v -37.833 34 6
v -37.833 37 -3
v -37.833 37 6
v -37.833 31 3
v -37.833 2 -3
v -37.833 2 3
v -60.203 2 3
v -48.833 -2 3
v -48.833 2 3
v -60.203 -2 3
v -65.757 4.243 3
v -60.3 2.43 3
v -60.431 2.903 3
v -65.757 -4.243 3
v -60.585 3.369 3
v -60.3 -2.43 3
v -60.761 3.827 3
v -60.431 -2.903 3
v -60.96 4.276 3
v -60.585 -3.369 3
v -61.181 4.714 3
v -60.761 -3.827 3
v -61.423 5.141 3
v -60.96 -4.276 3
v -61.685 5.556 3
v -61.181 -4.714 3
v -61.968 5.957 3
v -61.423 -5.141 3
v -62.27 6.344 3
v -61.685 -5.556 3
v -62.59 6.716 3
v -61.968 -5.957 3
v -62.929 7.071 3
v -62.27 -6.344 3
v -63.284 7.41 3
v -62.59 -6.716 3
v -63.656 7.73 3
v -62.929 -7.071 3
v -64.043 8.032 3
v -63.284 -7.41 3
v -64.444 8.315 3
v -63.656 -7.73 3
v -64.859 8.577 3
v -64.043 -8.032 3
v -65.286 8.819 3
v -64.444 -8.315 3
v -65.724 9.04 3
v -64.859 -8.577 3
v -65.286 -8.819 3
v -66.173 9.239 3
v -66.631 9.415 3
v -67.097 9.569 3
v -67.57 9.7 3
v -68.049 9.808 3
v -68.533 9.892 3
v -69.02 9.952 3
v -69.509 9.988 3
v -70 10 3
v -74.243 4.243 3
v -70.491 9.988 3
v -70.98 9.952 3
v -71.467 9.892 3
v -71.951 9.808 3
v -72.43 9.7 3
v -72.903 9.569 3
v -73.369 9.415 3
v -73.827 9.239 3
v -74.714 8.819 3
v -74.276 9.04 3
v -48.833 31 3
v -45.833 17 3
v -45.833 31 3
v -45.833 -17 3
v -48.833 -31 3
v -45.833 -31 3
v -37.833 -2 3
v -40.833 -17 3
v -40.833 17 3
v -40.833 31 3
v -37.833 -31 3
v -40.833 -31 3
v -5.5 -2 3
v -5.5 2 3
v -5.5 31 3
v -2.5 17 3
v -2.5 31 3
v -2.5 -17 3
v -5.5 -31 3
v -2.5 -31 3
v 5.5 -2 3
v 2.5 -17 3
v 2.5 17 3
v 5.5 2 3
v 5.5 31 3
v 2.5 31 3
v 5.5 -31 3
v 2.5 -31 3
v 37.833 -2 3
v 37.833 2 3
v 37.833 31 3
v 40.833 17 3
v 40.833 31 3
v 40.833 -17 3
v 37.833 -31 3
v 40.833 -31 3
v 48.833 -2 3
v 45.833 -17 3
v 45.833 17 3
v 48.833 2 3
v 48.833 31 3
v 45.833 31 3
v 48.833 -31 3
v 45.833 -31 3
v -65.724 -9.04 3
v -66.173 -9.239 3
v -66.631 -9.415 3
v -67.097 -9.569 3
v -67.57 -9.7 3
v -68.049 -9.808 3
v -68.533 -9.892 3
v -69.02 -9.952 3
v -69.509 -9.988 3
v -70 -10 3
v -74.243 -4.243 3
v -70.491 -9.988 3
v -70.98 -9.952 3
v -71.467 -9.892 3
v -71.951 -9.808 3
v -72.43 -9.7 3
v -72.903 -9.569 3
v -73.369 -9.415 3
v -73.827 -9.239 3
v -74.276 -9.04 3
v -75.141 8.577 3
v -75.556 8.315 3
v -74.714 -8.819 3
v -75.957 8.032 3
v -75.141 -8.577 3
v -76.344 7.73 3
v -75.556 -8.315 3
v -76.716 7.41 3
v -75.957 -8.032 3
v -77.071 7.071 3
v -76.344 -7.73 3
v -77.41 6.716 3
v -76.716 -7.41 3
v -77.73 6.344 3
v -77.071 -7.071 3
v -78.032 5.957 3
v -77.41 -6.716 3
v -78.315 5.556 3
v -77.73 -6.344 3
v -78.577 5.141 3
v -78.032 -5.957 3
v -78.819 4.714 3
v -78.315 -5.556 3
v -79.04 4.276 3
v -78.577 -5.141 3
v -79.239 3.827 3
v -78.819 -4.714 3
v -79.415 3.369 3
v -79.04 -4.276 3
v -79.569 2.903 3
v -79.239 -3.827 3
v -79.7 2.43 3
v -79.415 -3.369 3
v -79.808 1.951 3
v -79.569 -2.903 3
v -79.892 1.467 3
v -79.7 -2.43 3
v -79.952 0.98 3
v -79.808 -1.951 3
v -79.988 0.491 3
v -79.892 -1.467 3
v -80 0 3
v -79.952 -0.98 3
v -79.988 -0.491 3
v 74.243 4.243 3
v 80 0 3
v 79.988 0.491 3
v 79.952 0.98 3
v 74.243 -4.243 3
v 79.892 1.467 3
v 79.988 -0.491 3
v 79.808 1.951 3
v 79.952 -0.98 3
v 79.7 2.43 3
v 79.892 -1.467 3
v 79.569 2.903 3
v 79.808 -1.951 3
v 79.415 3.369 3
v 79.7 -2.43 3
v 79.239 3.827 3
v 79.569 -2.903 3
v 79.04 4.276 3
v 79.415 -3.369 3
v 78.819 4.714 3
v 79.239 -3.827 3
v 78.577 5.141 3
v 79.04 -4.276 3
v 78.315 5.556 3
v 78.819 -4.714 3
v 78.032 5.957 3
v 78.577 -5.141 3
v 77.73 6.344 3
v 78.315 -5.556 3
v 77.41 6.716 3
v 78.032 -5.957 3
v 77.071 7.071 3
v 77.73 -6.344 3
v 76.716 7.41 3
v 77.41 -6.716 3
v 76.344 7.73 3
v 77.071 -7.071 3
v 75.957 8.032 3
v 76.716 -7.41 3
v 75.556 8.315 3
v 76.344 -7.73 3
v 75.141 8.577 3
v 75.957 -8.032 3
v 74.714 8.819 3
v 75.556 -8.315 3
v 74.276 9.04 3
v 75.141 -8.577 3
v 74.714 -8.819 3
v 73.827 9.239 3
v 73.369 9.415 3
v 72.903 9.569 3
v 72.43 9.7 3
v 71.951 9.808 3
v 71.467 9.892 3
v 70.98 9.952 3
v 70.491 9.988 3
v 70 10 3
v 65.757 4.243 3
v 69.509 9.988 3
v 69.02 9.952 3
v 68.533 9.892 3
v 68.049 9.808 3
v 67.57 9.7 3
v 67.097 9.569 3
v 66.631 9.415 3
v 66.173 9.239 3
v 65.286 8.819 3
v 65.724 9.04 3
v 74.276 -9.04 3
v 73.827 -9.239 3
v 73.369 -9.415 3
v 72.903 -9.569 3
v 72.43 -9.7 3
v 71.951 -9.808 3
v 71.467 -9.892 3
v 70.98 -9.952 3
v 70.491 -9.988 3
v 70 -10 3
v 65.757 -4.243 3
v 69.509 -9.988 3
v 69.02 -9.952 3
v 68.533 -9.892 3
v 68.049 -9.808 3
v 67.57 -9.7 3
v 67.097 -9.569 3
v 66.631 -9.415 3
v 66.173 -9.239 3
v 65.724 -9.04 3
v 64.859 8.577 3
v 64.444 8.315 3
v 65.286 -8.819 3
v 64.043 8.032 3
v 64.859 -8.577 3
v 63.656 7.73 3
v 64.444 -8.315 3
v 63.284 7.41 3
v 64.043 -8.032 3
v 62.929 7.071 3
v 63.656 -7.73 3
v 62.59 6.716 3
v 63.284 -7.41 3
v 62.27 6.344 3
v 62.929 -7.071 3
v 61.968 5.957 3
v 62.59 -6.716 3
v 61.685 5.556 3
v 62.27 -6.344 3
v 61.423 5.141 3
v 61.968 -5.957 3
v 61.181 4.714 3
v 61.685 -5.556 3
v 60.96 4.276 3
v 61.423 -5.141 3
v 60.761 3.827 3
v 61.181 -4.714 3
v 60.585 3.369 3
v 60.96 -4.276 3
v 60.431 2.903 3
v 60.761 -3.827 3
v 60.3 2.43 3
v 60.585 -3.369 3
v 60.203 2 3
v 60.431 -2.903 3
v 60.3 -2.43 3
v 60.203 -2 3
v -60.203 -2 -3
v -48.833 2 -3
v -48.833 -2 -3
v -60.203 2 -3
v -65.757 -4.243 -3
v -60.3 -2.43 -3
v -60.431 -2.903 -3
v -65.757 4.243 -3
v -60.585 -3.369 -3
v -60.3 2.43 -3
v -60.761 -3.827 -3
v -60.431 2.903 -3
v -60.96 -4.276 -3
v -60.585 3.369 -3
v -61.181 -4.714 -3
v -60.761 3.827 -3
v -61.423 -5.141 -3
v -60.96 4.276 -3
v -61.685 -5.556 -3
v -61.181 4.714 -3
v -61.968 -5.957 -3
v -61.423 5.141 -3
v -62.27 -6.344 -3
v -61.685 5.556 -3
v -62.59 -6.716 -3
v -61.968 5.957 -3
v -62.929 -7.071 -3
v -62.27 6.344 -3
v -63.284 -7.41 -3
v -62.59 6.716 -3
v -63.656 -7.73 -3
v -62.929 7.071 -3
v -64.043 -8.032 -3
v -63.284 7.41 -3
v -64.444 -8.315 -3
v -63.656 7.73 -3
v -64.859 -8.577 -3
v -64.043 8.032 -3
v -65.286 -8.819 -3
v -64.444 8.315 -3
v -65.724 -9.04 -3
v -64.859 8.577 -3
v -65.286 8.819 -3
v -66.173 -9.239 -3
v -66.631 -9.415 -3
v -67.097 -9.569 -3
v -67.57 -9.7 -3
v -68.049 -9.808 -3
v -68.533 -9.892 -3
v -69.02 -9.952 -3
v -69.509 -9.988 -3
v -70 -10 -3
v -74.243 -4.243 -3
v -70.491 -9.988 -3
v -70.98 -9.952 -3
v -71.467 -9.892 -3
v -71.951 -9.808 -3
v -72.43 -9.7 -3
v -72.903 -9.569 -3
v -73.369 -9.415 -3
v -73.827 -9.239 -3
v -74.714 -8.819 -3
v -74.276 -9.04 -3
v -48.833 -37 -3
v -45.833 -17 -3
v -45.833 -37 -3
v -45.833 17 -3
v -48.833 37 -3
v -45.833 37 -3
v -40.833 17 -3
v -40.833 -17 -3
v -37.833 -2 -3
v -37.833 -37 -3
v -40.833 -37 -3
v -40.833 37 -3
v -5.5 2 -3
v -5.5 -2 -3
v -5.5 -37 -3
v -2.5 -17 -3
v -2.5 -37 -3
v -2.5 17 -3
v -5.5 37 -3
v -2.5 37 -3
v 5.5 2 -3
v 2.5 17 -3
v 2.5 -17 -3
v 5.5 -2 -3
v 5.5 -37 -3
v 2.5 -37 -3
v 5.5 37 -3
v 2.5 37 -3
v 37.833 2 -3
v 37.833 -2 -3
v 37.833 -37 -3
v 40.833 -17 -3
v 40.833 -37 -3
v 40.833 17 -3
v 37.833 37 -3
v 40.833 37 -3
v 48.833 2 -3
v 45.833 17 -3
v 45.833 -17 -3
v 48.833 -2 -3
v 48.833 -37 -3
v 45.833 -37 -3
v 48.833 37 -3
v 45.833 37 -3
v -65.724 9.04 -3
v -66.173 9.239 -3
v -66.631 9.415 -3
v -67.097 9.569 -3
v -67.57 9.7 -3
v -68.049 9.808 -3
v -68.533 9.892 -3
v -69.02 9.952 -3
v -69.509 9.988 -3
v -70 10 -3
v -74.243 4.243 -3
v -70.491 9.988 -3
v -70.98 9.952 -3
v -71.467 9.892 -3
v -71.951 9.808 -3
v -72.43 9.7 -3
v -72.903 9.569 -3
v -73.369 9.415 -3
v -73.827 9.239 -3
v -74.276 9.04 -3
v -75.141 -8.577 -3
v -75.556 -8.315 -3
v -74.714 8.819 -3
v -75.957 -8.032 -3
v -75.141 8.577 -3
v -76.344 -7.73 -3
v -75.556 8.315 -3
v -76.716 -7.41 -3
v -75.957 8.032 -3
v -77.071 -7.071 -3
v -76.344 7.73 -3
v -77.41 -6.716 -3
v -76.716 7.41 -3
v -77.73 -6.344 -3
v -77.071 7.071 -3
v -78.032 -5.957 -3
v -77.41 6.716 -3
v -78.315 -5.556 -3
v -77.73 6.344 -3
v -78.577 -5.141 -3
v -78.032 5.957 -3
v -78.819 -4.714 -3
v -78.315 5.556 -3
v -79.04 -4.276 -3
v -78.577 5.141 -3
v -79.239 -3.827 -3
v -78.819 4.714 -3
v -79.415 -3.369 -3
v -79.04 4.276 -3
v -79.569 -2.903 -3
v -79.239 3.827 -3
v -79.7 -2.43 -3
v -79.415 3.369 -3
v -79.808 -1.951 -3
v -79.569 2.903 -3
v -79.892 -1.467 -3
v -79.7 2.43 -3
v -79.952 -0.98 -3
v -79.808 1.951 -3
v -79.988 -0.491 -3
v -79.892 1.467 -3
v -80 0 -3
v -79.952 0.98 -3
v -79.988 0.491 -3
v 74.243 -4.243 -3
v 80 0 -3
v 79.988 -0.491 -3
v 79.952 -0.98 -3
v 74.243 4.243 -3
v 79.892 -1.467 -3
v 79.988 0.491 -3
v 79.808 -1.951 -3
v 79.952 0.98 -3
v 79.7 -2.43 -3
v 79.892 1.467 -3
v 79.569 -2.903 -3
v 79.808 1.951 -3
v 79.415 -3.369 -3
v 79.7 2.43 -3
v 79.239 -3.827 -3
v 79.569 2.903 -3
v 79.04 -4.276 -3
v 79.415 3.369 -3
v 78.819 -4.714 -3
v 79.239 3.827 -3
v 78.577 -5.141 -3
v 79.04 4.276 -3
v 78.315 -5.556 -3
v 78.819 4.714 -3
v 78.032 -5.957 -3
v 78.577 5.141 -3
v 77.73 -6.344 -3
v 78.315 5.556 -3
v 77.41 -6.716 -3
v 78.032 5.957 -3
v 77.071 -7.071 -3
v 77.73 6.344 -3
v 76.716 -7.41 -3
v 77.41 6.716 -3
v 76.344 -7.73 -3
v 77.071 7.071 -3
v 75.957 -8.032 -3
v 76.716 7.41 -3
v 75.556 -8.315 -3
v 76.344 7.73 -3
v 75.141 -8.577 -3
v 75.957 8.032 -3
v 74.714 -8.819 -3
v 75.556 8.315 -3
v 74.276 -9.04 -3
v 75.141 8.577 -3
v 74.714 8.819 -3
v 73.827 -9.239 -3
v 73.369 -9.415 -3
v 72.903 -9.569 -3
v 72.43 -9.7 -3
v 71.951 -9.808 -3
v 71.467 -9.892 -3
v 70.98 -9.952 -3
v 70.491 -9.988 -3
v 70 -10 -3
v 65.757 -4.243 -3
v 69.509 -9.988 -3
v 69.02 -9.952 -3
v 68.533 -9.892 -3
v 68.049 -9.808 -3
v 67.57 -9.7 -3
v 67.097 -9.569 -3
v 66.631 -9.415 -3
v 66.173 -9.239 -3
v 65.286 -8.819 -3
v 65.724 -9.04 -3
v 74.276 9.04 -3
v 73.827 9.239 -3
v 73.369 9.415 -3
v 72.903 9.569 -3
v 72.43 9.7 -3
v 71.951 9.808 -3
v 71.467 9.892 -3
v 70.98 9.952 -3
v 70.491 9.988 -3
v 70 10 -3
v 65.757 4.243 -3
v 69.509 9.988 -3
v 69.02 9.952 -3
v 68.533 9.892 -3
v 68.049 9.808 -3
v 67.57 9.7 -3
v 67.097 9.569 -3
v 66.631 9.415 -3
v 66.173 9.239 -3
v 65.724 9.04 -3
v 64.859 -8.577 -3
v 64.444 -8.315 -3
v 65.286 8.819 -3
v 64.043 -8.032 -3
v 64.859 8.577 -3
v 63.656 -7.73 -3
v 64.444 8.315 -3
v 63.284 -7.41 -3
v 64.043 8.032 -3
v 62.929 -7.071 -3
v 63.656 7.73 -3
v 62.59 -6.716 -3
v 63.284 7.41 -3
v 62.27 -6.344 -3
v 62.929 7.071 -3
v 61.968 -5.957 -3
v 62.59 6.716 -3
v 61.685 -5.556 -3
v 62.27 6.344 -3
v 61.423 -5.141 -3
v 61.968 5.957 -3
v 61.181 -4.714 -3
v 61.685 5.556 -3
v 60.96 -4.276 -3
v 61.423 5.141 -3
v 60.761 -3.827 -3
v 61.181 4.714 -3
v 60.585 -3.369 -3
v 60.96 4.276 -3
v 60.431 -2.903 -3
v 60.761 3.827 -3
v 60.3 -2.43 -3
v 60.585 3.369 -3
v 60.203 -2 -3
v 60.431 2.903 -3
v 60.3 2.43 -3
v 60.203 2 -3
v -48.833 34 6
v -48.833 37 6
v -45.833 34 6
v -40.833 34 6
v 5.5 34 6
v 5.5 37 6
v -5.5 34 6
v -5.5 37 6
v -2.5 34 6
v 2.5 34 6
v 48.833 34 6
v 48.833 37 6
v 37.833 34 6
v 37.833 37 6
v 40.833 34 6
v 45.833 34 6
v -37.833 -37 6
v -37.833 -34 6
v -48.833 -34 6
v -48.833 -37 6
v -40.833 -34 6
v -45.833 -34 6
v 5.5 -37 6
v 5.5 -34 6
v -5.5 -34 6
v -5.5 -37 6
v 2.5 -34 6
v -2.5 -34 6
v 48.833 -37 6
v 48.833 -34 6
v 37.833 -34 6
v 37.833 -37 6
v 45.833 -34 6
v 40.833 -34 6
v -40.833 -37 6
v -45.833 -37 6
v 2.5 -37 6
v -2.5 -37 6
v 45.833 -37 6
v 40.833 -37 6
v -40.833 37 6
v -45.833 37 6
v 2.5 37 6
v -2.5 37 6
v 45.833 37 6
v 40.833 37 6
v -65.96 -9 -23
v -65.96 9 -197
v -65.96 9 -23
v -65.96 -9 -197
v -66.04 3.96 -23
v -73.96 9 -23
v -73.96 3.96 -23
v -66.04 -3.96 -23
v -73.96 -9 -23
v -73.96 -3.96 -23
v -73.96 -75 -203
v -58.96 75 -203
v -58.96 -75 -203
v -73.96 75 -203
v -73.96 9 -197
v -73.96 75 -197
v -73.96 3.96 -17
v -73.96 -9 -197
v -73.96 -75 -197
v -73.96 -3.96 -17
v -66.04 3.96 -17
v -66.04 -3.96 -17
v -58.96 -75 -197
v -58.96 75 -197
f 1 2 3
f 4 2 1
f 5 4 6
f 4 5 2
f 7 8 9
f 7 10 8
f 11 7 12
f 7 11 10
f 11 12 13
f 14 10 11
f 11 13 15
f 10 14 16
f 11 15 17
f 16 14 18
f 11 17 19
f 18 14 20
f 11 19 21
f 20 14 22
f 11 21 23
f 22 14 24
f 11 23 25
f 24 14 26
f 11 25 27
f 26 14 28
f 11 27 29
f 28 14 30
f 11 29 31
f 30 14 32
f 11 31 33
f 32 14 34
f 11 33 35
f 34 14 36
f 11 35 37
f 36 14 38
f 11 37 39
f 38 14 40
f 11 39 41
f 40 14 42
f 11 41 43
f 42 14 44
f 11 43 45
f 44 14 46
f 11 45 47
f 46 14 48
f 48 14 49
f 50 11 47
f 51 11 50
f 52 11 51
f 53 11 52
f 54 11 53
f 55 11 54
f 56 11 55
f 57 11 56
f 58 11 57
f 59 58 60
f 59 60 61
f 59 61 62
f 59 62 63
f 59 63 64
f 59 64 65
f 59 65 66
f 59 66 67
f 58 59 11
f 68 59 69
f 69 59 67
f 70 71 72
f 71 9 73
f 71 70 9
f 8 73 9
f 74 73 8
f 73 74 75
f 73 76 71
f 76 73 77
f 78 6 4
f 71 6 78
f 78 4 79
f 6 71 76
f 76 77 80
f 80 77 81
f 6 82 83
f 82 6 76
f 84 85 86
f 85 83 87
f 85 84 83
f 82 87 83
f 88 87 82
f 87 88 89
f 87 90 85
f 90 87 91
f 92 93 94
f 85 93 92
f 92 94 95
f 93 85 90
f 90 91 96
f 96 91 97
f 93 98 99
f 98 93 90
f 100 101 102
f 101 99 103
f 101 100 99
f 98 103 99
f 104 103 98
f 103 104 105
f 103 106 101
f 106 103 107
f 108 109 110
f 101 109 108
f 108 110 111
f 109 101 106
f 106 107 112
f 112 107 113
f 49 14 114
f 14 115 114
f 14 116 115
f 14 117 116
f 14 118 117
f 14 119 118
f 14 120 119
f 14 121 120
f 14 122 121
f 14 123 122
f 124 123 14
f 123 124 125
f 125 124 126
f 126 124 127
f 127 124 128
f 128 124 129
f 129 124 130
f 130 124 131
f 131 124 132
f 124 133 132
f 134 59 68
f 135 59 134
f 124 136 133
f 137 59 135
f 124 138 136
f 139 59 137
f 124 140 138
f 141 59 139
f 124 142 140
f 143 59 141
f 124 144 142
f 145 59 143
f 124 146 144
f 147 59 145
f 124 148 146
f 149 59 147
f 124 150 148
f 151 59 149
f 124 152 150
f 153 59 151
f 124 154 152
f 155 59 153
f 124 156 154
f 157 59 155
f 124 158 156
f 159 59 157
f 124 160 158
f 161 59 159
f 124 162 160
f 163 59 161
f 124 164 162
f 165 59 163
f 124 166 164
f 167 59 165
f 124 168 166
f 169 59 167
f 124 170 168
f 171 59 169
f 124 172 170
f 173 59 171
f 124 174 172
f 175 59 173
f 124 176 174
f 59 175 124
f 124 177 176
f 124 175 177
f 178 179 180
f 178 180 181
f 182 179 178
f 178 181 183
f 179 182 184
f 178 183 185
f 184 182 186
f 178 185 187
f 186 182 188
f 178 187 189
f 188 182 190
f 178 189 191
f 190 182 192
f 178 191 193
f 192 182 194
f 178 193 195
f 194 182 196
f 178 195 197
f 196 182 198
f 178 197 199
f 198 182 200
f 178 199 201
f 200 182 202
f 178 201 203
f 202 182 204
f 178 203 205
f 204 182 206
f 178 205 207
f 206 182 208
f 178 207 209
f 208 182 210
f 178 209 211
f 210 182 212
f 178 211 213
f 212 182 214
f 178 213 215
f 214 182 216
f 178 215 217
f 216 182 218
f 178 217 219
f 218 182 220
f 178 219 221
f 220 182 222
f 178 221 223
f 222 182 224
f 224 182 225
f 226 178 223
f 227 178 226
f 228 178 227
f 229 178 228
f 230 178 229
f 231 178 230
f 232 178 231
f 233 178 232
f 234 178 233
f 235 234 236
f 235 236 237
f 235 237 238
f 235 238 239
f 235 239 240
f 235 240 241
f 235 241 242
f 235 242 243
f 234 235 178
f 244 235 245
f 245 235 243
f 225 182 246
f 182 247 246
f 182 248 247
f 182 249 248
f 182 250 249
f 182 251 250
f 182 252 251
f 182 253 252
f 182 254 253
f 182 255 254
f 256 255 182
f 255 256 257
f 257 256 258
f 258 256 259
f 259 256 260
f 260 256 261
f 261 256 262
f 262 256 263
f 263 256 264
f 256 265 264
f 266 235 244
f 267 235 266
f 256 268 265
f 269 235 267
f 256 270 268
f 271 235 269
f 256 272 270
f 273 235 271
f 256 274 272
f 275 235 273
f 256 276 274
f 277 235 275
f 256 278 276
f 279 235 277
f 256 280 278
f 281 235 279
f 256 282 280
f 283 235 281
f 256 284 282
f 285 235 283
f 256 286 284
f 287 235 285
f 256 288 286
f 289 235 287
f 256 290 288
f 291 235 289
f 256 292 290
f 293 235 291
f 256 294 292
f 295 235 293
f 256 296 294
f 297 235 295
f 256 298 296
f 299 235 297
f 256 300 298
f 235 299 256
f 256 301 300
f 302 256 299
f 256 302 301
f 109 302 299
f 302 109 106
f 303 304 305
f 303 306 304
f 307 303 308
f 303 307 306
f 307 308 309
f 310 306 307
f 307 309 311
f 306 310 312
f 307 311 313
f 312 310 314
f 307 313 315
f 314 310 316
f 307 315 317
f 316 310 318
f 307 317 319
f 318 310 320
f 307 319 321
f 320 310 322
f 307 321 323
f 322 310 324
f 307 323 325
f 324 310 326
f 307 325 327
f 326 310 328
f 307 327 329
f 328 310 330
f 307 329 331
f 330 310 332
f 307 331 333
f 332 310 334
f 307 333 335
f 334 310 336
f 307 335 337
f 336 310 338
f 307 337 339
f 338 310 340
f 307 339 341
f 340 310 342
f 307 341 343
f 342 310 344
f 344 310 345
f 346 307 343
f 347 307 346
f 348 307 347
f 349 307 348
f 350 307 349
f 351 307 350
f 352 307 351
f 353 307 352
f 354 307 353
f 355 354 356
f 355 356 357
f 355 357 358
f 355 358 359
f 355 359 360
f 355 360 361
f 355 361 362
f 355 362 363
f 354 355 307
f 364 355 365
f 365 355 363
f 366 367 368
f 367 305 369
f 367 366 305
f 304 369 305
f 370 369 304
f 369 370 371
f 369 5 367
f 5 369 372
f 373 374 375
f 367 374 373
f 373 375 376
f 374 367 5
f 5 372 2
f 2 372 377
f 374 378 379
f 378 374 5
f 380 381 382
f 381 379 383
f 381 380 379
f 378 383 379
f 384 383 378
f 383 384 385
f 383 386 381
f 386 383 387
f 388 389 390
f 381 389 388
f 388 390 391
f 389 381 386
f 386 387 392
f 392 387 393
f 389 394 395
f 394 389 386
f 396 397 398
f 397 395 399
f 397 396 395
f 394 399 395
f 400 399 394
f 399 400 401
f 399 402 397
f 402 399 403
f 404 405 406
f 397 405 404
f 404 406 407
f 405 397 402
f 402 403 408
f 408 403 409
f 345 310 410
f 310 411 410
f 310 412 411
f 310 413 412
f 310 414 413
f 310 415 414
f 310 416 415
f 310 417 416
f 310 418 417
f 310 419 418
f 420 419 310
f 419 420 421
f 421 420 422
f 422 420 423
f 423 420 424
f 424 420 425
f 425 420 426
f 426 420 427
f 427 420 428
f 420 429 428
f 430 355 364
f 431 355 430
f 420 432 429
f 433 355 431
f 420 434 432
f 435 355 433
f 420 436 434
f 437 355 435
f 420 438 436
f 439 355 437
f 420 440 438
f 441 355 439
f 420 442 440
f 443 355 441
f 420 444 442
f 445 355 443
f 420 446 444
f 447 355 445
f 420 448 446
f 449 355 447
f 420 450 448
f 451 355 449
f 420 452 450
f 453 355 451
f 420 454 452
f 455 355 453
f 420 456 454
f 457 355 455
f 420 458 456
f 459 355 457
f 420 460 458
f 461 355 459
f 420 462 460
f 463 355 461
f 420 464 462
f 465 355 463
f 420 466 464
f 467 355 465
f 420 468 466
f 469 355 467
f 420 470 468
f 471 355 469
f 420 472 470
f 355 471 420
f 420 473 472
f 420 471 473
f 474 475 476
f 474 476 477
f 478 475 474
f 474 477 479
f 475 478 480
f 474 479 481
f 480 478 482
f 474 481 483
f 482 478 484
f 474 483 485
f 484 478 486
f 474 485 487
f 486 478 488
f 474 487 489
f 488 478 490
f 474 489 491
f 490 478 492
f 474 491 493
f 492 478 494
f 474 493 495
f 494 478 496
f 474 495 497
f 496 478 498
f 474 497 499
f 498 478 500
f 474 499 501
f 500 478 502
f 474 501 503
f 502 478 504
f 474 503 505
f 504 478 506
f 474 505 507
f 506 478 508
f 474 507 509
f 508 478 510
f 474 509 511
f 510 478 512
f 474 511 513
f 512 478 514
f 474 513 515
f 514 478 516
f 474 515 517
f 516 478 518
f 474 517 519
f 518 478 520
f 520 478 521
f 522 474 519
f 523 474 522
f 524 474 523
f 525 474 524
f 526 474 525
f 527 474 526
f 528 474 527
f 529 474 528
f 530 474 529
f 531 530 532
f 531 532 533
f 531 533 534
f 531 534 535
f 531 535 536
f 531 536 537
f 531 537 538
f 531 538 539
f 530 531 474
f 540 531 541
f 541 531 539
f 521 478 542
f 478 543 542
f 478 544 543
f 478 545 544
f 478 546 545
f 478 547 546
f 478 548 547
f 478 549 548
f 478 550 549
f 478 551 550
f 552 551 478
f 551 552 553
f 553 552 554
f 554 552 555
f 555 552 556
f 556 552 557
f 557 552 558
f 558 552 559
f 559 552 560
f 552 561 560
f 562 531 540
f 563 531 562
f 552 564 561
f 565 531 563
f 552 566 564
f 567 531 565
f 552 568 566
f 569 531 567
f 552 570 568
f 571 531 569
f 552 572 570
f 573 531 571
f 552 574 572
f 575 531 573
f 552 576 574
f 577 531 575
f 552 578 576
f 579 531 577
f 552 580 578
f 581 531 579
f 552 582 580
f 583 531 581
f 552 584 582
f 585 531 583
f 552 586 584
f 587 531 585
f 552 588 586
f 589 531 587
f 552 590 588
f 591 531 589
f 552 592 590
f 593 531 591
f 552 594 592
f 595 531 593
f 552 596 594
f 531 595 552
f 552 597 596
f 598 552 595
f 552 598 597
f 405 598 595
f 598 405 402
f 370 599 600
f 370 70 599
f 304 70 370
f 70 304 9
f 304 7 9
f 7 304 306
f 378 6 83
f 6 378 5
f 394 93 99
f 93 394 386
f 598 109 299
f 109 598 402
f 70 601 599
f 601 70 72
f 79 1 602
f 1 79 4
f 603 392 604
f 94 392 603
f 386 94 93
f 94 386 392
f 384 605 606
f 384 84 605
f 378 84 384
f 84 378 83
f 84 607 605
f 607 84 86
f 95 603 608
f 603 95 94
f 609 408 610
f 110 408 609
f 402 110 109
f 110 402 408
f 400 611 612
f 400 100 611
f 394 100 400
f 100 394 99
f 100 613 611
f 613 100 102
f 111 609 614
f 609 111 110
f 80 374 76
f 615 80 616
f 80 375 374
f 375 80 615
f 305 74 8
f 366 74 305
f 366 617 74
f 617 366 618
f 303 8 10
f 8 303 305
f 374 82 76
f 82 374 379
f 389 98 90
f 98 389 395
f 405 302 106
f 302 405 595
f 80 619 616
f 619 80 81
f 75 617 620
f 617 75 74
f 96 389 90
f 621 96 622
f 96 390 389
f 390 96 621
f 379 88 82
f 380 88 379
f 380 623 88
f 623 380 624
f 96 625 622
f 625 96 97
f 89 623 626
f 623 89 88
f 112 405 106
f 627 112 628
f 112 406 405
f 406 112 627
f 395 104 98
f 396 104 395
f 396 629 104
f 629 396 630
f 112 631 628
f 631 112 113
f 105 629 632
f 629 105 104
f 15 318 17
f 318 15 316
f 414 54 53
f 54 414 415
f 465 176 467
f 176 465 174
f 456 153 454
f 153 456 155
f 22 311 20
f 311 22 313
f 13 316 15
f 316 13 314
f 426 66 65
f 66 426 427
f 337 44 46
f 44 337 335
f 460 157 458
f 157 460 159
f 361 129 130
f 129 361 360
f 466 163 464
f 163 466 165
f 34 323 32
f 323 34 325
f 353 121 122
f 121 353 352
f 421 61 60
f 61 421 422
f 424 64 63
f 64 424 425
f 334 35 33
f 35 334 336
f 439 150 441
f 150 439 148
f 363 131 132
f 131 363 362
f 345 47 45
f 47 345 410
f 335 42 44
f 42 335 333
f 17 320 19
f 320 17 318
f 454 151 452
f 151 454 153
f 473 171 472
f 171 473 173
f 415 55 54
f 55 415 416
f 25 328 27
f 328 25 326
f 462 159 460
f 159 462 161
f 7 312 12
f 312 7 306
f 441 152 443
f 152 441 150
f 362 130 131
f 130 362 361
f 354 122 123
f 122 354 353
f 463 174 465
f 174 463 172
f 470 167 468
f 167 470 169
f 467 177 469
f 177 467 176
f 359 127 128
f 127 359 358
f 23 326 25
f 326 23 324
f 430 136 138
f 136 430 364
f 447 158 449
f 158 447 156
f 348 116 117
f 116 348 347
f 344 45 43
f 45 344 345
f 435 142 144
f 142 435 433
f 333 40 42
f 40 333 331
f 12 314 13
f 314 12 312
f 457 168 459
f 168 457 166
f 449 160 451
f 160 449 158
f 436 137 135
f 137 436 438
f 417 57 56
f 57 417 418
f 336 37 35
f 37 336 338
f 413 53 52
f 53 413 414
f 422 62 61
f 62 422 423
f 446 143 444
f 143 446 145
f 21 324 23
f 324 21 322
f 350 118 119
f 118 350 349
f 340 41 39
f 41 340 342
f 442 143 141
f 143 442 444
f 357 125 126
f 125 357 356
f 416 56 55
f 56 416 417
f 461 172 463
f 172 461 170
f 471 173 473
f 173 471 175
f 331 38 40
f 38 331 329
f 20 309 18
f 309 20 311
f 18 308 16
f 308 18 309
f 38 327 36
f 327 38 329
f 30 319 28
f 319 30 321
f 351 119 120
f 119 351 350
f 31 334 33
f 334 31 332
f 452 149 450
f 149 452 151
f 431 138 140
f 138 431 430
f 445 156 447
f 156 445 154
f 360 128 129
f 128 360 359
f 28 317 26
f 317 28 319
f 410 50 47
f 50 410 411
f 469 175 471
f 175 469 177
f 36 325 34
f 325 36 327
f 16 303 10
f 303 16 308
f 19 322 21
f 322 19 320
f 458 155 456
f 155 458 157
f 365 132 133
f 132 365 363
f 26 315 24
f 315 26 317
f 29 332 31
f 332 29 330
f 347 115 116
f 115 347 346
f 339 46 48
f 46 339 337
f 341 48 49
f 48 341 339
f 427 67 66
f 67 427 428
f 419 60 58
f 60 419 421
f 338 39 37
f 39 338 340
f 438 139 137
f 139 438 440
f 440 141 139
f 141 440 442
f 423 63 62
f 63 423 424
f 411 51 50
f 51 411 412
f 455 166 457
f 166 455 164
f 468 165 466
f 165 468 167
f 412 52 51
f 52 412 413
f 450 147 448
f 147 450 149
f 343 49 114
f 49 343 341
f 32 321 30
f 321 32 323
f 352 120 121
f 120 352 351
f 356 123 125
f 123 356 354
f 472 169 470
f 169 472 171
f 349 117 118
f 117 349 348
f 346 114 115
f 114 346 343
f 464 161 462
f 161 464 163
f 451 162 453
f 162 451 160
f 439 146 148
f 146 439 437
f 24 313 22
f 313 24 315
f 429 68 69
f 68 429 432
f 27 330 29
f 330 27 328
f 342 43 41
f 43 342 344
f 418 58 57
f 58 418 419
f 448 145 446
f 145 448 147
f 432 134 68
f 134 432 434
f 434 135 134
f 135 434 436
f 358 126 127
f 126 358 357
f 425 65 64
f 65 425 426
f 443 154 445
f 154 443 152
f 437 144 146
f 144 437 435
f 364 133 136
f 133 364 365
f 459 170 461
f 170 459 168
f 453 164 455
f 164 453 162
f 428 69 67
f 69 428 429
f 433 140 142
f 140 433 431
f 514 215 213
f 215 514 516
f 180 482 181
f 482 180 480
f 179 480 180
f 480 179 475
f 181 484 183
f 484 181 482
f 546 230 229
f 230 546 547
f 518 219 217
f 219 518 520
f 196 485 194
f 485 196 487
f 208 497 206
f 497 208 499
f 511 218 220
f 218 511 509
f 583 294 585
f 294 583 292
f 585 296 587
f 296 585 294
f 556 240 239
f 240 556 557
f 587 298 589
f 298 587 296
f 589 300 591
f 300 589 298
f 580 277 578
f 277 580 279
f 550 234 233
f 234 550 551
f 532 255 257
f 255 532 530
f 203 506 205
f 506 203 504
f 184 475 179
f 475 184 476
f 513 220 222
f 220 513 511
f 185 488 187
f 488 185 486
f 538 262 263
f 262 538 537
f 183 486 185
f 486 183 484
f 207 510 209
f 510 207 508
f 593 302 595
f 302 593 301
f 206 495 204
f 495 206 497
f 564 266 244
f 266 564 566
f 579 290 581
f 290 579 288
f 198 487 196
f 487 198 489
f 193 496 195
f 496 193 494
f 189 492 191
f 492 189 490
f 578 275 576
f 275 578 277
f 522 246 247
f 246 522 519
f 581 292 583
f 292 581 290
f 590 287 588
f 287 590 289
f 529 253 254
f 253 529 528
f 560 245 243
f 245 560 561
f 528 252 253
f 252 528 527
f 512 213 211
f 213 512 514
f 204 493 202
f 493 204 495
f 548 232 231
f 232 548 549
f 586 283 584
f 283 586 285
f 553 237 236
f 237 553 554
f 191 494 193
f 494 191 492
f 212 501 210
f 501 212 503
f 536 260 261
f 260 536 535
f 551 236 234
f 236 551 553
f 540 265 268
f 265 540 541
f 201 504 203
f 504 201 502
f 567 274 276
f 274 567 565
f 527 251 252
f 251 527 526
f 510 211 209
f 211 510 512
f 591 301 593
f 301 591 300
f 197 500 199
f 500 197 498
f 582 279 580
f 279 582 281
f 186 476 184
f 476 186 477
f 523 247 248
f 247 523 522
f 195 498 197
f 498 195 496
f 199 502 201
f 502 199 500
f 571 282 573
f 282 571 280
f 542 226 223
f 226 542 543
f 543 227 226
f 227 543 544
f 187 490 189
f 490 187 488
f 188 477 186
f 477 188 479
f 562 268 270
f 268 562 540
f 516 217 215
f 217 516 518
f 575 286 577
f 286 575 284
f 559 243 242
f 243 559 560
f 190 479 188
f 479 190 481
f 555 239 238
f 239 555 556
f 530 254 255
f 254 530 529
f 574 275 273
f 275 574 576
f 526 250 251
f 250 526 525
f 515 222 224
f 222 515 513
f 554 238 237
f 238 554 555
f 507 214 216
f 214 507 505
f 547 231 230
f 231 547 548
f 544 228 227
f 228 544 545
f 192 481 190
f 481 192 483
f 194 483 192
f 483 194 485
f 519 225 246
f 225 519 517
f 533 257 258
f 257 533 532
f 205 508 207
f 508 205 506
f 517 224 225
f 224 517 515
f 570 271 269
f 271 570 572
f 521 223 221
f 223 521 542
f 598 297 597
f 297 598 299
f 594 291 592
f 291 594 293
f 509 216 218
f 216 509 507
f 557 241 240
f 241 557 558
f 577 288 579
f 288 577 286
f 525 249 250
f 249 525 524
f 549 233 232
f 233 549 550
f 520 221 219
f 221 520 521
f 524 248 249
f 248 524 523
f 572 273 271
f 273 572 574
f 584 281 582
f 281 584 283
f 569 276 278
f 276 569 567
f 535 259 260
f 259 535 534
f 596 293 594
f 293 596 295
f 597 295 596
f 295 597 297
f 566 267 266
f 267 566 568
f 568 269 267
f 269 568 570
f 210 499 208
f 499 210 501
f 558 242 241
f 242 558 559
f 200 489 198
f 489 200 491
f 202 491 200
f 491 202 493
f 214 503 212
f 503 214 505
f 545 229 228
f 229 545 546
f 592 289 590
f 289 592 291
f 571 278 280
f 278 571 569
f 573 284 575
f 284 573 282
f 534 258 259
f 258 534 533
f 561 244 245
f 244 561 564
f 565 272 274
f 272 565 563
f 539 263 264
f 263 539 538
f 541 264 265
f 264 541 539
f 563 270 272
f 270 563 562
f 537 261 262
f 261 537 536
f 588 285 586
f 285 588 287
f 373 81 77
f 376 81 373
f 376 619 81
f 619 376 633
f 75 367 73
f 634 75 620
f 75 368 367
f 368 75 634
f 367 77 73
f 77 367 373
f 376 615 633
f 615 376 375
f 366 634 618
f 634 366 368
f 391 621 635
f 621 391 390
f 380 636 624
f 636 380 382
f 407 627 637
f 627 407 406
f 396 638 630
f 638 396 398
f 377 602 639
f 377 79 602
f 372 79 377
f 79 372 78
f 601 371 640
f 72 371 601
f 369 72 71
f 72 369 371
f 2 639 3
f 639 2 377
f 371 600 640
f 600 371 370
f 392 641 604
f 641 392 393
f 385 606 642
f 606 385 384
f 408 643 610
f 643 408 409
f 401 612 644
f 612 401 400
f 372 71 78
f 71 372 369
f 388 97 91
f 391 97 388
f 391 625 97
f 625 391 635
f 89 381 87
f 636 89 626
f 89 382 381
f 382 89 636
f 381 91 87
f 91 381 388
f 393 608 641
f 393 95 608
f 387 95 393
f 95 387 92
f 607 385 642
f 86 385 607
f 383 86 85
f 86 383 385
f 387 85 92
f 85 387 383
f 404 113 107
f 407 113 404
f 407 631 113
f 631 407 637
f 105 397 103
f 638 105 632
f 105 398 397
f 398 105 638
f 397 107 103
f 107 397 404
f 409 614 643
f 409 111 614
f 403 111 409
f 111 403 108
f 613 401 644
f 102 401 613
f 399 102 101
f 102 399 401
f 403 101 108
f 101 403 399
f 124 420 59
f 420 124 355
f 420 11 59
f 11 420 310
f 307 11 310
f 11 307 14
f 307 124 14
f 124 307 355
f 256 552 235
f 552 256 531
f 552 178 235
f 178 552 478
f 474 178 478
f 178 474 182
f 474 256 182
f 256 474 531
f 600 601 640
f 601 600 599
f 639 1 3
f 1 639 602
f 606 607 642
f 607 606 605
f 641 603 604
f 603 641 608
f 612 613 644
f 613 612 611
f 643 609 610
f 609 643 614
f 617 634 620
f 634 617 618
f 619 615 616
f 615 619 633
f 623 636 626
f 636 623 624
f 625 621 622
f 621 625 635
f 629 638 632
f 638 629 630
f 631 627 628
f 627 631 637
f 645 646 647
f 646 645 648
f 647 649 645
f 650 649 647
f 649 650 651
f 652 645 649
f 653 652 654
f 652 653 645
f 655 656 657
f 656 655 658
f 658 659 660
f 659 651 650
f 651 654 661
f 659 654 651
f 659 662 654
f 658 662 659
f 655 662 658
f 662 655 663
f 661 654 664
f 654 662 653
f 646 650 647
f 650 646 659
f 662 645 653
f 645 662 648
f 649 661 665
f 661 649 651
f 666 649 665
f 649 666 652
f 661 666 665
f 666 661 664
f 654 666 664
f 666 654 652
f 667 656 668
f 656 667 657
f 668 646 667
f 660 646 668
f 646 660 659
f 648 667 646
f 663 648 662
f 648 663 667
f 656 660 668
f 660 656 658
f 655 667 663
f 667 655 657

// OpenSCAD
////////////////////////////////////////////////////////////////////////////////
// Micropipette Rack
// Original: PIPETTE RACK v1 (2014-02-24) by Tom Baden 
// Thingiverse: https://www.thingiverse.com/thing:257254
// Inspired by kwalus (http://www.thingiverse.com/thing:64977)
////////////////////////////////////////////////////////////////////////////////

// ==============================
// User-tunable parameters
// ==============================

/* [Parameters:] */

// One- or two-sided version
side_count = 2; // [1,2]

// Rack dimensions
rack_length = 130; // [50:300]
rack_height = 180; // [150:220]

// Foot dimensions
foot_width = 150; // [100:200]
foot_length = 15; // [10:30]

// Material thickness multiplier
stability = 2; // [1:4]

// Printer precision tolerance
tol = 0.4; // [0.1,0.2,0.3,0.4,0.5]

/* [Preview Controls:] */
show_top_beam = true; // [true,false]
show_side_support = true; // [true,false]

// -----------------------------------------------------------------------------
// CUSTOMIZER CUTOFF: modify below at your own risk
// -----------------------------------------------------------------------------
module customizer_cutoff(){}; // legacy marker

// ==============================
// Global constants
// ==============================

$fn = $preview ? 32 : 128;
z_fight = $preview ? 0.05 : 0;

sep = 20;

X = rack_length;
Z = rack_height;
Y = 18;

wall_y = 2 * stability;
wall_z = 3 * stability;
wall_x = 4 * stability;

hanger_x = 11;
hanger_y = 35;

slot_depth = 20;
slot_width = 5;

radius_end = 10;
radius_inner = 6;
radius_inner_fit = radius_inner - tol;
connect_width = sqrt(radius_inner_fit * radius_inner_fit * 2);

triangle_top = 30;
slot_count = round(X / 50);
is_double = (side_count == 2);

// ==============================
// Part A – Top beam with hangers
// ==============================

module top_beam() {
  // main beam
  cube([X, wall_y, wall_z], center=true);

  // rounded ends
  translate([-X / 2 - radius_end / 2, 0, 0])
    cylinder(r=radius_end, h=wall_z, center=true);
  translate([X / 2 + radius_end / 2, 0, 0])
    cylinder(r=radius_end, h=wall_z, center=true);

  // hangers
  for (i = [1:slot_count]) {
    x_pos = -X / 2 + (i - 0.5) * X / slot_count;

    // front side hanger
    translate([x_pos, -hanger_y / 2 - wall_y / 2, 0])
      cube([hanger_x, hanger_y, wall_z], center=true);
    translate([x_pos, -hanger_y - wall_y / 2, wall_z / 2])
      rotate([45, 0, 0])
        cube([hanger_x, sqrt(2) * wall_z, sqrt(2) * wall_z], center=true);

    if (is_double) {
      // back side hanger
      translate([x_pos, hanger_y / 2 + wall_y / 2, 0])
        cube([hanger_x, hanger_y, wall_z], center=true);
      translate([x_pos, hanger_y + wall_y / 2, wall_z / 2])
        rotate([45, 0, 0])
          cube([hanger_x, sqrt(2) * wall_z, sqrt(2) * wall_z], center=true);
    }
  }
}

module top_beam_cutouts() {
  // end-holes (square)
  translate([-X / 2 - radius_end / 2, 0, 0])
    rotate([0, 0, 45])
      cylinder($fn=4, r=radius_inner, h=wall_z + z_fight, center=true);
  translate([X / 2 + radius_end / 2, 0, 0])
    rotate([0, 0, 45])
      cylinder($fn=4, r=radius_inner, h=wall_z + z_fight, center=true);

  // tip slots
  for (i = [1:slot_count]) {
    x_pos = -X / 2 + (i - 0.5) * X / slot_count;
    translate([x_pos, slot_depth / 2 - hanger_y - wall_y / 2 - z_fight, wall_z / 2])
      cube([slot_width, slot_depth, wall_z * 2 + z_fight], center=true);
    if (is_double)
      translate([x_pos, -slot_depth / 2 + hanger_y + wall_y / 2 + z_fight, wall_z / 2])
        cube([slot_width, slot_depth, wall_z * 2 + z_fight], center=true);
  }

  // side end cuts
  translate([0, -hanger_y - wall_y * 1.5, wall_z / 2])
    cube([X, wall_y * 2, wall_z * 2], center=true);
  translate([0, hanger_y + wall_y * 1.5, wall_z / 2])
    cube([X, wall_y * 2, wall_z * 2], center=true);

  // top surface cut
  translate([0, 0, wall_z * 1.5])
    cube([X, (hanger_y + wall_y) * 2, wall_z], center=true);
}

// Emit Part A
if (show_top_beam)
  difference() { top_beam(); top_beam_cutouts(); }

// ==============================
// Part B – Side support & foot
// ==============================
module side_support() {
  // vertical leg
  translate([-X / 2 - radius_end / 2 - connect_width / 2 + wall_x / 2, 0, -Z / 2 - wall_z / 2 - sep])
    cube([wall_x, Y, Z], center=true);

  // connection socket
  translate([-X / 2 - radius_end / 2, 0, -sep])
    rotate([0, 0, 45])
      cylinder($fn=4, r=radius_inner_fit, h=wall_z, center=true);

  // foot pad
  translate([-X / 2 - radius_end / 2 - connect_width / 2 + foot_length / 2, 0, -Z - sep])
    cube([foot_length, foot_width, wall_z], center=true);
}

if (show_side_support)
  side_support();

// ==============================
// End of file
// ==============================
